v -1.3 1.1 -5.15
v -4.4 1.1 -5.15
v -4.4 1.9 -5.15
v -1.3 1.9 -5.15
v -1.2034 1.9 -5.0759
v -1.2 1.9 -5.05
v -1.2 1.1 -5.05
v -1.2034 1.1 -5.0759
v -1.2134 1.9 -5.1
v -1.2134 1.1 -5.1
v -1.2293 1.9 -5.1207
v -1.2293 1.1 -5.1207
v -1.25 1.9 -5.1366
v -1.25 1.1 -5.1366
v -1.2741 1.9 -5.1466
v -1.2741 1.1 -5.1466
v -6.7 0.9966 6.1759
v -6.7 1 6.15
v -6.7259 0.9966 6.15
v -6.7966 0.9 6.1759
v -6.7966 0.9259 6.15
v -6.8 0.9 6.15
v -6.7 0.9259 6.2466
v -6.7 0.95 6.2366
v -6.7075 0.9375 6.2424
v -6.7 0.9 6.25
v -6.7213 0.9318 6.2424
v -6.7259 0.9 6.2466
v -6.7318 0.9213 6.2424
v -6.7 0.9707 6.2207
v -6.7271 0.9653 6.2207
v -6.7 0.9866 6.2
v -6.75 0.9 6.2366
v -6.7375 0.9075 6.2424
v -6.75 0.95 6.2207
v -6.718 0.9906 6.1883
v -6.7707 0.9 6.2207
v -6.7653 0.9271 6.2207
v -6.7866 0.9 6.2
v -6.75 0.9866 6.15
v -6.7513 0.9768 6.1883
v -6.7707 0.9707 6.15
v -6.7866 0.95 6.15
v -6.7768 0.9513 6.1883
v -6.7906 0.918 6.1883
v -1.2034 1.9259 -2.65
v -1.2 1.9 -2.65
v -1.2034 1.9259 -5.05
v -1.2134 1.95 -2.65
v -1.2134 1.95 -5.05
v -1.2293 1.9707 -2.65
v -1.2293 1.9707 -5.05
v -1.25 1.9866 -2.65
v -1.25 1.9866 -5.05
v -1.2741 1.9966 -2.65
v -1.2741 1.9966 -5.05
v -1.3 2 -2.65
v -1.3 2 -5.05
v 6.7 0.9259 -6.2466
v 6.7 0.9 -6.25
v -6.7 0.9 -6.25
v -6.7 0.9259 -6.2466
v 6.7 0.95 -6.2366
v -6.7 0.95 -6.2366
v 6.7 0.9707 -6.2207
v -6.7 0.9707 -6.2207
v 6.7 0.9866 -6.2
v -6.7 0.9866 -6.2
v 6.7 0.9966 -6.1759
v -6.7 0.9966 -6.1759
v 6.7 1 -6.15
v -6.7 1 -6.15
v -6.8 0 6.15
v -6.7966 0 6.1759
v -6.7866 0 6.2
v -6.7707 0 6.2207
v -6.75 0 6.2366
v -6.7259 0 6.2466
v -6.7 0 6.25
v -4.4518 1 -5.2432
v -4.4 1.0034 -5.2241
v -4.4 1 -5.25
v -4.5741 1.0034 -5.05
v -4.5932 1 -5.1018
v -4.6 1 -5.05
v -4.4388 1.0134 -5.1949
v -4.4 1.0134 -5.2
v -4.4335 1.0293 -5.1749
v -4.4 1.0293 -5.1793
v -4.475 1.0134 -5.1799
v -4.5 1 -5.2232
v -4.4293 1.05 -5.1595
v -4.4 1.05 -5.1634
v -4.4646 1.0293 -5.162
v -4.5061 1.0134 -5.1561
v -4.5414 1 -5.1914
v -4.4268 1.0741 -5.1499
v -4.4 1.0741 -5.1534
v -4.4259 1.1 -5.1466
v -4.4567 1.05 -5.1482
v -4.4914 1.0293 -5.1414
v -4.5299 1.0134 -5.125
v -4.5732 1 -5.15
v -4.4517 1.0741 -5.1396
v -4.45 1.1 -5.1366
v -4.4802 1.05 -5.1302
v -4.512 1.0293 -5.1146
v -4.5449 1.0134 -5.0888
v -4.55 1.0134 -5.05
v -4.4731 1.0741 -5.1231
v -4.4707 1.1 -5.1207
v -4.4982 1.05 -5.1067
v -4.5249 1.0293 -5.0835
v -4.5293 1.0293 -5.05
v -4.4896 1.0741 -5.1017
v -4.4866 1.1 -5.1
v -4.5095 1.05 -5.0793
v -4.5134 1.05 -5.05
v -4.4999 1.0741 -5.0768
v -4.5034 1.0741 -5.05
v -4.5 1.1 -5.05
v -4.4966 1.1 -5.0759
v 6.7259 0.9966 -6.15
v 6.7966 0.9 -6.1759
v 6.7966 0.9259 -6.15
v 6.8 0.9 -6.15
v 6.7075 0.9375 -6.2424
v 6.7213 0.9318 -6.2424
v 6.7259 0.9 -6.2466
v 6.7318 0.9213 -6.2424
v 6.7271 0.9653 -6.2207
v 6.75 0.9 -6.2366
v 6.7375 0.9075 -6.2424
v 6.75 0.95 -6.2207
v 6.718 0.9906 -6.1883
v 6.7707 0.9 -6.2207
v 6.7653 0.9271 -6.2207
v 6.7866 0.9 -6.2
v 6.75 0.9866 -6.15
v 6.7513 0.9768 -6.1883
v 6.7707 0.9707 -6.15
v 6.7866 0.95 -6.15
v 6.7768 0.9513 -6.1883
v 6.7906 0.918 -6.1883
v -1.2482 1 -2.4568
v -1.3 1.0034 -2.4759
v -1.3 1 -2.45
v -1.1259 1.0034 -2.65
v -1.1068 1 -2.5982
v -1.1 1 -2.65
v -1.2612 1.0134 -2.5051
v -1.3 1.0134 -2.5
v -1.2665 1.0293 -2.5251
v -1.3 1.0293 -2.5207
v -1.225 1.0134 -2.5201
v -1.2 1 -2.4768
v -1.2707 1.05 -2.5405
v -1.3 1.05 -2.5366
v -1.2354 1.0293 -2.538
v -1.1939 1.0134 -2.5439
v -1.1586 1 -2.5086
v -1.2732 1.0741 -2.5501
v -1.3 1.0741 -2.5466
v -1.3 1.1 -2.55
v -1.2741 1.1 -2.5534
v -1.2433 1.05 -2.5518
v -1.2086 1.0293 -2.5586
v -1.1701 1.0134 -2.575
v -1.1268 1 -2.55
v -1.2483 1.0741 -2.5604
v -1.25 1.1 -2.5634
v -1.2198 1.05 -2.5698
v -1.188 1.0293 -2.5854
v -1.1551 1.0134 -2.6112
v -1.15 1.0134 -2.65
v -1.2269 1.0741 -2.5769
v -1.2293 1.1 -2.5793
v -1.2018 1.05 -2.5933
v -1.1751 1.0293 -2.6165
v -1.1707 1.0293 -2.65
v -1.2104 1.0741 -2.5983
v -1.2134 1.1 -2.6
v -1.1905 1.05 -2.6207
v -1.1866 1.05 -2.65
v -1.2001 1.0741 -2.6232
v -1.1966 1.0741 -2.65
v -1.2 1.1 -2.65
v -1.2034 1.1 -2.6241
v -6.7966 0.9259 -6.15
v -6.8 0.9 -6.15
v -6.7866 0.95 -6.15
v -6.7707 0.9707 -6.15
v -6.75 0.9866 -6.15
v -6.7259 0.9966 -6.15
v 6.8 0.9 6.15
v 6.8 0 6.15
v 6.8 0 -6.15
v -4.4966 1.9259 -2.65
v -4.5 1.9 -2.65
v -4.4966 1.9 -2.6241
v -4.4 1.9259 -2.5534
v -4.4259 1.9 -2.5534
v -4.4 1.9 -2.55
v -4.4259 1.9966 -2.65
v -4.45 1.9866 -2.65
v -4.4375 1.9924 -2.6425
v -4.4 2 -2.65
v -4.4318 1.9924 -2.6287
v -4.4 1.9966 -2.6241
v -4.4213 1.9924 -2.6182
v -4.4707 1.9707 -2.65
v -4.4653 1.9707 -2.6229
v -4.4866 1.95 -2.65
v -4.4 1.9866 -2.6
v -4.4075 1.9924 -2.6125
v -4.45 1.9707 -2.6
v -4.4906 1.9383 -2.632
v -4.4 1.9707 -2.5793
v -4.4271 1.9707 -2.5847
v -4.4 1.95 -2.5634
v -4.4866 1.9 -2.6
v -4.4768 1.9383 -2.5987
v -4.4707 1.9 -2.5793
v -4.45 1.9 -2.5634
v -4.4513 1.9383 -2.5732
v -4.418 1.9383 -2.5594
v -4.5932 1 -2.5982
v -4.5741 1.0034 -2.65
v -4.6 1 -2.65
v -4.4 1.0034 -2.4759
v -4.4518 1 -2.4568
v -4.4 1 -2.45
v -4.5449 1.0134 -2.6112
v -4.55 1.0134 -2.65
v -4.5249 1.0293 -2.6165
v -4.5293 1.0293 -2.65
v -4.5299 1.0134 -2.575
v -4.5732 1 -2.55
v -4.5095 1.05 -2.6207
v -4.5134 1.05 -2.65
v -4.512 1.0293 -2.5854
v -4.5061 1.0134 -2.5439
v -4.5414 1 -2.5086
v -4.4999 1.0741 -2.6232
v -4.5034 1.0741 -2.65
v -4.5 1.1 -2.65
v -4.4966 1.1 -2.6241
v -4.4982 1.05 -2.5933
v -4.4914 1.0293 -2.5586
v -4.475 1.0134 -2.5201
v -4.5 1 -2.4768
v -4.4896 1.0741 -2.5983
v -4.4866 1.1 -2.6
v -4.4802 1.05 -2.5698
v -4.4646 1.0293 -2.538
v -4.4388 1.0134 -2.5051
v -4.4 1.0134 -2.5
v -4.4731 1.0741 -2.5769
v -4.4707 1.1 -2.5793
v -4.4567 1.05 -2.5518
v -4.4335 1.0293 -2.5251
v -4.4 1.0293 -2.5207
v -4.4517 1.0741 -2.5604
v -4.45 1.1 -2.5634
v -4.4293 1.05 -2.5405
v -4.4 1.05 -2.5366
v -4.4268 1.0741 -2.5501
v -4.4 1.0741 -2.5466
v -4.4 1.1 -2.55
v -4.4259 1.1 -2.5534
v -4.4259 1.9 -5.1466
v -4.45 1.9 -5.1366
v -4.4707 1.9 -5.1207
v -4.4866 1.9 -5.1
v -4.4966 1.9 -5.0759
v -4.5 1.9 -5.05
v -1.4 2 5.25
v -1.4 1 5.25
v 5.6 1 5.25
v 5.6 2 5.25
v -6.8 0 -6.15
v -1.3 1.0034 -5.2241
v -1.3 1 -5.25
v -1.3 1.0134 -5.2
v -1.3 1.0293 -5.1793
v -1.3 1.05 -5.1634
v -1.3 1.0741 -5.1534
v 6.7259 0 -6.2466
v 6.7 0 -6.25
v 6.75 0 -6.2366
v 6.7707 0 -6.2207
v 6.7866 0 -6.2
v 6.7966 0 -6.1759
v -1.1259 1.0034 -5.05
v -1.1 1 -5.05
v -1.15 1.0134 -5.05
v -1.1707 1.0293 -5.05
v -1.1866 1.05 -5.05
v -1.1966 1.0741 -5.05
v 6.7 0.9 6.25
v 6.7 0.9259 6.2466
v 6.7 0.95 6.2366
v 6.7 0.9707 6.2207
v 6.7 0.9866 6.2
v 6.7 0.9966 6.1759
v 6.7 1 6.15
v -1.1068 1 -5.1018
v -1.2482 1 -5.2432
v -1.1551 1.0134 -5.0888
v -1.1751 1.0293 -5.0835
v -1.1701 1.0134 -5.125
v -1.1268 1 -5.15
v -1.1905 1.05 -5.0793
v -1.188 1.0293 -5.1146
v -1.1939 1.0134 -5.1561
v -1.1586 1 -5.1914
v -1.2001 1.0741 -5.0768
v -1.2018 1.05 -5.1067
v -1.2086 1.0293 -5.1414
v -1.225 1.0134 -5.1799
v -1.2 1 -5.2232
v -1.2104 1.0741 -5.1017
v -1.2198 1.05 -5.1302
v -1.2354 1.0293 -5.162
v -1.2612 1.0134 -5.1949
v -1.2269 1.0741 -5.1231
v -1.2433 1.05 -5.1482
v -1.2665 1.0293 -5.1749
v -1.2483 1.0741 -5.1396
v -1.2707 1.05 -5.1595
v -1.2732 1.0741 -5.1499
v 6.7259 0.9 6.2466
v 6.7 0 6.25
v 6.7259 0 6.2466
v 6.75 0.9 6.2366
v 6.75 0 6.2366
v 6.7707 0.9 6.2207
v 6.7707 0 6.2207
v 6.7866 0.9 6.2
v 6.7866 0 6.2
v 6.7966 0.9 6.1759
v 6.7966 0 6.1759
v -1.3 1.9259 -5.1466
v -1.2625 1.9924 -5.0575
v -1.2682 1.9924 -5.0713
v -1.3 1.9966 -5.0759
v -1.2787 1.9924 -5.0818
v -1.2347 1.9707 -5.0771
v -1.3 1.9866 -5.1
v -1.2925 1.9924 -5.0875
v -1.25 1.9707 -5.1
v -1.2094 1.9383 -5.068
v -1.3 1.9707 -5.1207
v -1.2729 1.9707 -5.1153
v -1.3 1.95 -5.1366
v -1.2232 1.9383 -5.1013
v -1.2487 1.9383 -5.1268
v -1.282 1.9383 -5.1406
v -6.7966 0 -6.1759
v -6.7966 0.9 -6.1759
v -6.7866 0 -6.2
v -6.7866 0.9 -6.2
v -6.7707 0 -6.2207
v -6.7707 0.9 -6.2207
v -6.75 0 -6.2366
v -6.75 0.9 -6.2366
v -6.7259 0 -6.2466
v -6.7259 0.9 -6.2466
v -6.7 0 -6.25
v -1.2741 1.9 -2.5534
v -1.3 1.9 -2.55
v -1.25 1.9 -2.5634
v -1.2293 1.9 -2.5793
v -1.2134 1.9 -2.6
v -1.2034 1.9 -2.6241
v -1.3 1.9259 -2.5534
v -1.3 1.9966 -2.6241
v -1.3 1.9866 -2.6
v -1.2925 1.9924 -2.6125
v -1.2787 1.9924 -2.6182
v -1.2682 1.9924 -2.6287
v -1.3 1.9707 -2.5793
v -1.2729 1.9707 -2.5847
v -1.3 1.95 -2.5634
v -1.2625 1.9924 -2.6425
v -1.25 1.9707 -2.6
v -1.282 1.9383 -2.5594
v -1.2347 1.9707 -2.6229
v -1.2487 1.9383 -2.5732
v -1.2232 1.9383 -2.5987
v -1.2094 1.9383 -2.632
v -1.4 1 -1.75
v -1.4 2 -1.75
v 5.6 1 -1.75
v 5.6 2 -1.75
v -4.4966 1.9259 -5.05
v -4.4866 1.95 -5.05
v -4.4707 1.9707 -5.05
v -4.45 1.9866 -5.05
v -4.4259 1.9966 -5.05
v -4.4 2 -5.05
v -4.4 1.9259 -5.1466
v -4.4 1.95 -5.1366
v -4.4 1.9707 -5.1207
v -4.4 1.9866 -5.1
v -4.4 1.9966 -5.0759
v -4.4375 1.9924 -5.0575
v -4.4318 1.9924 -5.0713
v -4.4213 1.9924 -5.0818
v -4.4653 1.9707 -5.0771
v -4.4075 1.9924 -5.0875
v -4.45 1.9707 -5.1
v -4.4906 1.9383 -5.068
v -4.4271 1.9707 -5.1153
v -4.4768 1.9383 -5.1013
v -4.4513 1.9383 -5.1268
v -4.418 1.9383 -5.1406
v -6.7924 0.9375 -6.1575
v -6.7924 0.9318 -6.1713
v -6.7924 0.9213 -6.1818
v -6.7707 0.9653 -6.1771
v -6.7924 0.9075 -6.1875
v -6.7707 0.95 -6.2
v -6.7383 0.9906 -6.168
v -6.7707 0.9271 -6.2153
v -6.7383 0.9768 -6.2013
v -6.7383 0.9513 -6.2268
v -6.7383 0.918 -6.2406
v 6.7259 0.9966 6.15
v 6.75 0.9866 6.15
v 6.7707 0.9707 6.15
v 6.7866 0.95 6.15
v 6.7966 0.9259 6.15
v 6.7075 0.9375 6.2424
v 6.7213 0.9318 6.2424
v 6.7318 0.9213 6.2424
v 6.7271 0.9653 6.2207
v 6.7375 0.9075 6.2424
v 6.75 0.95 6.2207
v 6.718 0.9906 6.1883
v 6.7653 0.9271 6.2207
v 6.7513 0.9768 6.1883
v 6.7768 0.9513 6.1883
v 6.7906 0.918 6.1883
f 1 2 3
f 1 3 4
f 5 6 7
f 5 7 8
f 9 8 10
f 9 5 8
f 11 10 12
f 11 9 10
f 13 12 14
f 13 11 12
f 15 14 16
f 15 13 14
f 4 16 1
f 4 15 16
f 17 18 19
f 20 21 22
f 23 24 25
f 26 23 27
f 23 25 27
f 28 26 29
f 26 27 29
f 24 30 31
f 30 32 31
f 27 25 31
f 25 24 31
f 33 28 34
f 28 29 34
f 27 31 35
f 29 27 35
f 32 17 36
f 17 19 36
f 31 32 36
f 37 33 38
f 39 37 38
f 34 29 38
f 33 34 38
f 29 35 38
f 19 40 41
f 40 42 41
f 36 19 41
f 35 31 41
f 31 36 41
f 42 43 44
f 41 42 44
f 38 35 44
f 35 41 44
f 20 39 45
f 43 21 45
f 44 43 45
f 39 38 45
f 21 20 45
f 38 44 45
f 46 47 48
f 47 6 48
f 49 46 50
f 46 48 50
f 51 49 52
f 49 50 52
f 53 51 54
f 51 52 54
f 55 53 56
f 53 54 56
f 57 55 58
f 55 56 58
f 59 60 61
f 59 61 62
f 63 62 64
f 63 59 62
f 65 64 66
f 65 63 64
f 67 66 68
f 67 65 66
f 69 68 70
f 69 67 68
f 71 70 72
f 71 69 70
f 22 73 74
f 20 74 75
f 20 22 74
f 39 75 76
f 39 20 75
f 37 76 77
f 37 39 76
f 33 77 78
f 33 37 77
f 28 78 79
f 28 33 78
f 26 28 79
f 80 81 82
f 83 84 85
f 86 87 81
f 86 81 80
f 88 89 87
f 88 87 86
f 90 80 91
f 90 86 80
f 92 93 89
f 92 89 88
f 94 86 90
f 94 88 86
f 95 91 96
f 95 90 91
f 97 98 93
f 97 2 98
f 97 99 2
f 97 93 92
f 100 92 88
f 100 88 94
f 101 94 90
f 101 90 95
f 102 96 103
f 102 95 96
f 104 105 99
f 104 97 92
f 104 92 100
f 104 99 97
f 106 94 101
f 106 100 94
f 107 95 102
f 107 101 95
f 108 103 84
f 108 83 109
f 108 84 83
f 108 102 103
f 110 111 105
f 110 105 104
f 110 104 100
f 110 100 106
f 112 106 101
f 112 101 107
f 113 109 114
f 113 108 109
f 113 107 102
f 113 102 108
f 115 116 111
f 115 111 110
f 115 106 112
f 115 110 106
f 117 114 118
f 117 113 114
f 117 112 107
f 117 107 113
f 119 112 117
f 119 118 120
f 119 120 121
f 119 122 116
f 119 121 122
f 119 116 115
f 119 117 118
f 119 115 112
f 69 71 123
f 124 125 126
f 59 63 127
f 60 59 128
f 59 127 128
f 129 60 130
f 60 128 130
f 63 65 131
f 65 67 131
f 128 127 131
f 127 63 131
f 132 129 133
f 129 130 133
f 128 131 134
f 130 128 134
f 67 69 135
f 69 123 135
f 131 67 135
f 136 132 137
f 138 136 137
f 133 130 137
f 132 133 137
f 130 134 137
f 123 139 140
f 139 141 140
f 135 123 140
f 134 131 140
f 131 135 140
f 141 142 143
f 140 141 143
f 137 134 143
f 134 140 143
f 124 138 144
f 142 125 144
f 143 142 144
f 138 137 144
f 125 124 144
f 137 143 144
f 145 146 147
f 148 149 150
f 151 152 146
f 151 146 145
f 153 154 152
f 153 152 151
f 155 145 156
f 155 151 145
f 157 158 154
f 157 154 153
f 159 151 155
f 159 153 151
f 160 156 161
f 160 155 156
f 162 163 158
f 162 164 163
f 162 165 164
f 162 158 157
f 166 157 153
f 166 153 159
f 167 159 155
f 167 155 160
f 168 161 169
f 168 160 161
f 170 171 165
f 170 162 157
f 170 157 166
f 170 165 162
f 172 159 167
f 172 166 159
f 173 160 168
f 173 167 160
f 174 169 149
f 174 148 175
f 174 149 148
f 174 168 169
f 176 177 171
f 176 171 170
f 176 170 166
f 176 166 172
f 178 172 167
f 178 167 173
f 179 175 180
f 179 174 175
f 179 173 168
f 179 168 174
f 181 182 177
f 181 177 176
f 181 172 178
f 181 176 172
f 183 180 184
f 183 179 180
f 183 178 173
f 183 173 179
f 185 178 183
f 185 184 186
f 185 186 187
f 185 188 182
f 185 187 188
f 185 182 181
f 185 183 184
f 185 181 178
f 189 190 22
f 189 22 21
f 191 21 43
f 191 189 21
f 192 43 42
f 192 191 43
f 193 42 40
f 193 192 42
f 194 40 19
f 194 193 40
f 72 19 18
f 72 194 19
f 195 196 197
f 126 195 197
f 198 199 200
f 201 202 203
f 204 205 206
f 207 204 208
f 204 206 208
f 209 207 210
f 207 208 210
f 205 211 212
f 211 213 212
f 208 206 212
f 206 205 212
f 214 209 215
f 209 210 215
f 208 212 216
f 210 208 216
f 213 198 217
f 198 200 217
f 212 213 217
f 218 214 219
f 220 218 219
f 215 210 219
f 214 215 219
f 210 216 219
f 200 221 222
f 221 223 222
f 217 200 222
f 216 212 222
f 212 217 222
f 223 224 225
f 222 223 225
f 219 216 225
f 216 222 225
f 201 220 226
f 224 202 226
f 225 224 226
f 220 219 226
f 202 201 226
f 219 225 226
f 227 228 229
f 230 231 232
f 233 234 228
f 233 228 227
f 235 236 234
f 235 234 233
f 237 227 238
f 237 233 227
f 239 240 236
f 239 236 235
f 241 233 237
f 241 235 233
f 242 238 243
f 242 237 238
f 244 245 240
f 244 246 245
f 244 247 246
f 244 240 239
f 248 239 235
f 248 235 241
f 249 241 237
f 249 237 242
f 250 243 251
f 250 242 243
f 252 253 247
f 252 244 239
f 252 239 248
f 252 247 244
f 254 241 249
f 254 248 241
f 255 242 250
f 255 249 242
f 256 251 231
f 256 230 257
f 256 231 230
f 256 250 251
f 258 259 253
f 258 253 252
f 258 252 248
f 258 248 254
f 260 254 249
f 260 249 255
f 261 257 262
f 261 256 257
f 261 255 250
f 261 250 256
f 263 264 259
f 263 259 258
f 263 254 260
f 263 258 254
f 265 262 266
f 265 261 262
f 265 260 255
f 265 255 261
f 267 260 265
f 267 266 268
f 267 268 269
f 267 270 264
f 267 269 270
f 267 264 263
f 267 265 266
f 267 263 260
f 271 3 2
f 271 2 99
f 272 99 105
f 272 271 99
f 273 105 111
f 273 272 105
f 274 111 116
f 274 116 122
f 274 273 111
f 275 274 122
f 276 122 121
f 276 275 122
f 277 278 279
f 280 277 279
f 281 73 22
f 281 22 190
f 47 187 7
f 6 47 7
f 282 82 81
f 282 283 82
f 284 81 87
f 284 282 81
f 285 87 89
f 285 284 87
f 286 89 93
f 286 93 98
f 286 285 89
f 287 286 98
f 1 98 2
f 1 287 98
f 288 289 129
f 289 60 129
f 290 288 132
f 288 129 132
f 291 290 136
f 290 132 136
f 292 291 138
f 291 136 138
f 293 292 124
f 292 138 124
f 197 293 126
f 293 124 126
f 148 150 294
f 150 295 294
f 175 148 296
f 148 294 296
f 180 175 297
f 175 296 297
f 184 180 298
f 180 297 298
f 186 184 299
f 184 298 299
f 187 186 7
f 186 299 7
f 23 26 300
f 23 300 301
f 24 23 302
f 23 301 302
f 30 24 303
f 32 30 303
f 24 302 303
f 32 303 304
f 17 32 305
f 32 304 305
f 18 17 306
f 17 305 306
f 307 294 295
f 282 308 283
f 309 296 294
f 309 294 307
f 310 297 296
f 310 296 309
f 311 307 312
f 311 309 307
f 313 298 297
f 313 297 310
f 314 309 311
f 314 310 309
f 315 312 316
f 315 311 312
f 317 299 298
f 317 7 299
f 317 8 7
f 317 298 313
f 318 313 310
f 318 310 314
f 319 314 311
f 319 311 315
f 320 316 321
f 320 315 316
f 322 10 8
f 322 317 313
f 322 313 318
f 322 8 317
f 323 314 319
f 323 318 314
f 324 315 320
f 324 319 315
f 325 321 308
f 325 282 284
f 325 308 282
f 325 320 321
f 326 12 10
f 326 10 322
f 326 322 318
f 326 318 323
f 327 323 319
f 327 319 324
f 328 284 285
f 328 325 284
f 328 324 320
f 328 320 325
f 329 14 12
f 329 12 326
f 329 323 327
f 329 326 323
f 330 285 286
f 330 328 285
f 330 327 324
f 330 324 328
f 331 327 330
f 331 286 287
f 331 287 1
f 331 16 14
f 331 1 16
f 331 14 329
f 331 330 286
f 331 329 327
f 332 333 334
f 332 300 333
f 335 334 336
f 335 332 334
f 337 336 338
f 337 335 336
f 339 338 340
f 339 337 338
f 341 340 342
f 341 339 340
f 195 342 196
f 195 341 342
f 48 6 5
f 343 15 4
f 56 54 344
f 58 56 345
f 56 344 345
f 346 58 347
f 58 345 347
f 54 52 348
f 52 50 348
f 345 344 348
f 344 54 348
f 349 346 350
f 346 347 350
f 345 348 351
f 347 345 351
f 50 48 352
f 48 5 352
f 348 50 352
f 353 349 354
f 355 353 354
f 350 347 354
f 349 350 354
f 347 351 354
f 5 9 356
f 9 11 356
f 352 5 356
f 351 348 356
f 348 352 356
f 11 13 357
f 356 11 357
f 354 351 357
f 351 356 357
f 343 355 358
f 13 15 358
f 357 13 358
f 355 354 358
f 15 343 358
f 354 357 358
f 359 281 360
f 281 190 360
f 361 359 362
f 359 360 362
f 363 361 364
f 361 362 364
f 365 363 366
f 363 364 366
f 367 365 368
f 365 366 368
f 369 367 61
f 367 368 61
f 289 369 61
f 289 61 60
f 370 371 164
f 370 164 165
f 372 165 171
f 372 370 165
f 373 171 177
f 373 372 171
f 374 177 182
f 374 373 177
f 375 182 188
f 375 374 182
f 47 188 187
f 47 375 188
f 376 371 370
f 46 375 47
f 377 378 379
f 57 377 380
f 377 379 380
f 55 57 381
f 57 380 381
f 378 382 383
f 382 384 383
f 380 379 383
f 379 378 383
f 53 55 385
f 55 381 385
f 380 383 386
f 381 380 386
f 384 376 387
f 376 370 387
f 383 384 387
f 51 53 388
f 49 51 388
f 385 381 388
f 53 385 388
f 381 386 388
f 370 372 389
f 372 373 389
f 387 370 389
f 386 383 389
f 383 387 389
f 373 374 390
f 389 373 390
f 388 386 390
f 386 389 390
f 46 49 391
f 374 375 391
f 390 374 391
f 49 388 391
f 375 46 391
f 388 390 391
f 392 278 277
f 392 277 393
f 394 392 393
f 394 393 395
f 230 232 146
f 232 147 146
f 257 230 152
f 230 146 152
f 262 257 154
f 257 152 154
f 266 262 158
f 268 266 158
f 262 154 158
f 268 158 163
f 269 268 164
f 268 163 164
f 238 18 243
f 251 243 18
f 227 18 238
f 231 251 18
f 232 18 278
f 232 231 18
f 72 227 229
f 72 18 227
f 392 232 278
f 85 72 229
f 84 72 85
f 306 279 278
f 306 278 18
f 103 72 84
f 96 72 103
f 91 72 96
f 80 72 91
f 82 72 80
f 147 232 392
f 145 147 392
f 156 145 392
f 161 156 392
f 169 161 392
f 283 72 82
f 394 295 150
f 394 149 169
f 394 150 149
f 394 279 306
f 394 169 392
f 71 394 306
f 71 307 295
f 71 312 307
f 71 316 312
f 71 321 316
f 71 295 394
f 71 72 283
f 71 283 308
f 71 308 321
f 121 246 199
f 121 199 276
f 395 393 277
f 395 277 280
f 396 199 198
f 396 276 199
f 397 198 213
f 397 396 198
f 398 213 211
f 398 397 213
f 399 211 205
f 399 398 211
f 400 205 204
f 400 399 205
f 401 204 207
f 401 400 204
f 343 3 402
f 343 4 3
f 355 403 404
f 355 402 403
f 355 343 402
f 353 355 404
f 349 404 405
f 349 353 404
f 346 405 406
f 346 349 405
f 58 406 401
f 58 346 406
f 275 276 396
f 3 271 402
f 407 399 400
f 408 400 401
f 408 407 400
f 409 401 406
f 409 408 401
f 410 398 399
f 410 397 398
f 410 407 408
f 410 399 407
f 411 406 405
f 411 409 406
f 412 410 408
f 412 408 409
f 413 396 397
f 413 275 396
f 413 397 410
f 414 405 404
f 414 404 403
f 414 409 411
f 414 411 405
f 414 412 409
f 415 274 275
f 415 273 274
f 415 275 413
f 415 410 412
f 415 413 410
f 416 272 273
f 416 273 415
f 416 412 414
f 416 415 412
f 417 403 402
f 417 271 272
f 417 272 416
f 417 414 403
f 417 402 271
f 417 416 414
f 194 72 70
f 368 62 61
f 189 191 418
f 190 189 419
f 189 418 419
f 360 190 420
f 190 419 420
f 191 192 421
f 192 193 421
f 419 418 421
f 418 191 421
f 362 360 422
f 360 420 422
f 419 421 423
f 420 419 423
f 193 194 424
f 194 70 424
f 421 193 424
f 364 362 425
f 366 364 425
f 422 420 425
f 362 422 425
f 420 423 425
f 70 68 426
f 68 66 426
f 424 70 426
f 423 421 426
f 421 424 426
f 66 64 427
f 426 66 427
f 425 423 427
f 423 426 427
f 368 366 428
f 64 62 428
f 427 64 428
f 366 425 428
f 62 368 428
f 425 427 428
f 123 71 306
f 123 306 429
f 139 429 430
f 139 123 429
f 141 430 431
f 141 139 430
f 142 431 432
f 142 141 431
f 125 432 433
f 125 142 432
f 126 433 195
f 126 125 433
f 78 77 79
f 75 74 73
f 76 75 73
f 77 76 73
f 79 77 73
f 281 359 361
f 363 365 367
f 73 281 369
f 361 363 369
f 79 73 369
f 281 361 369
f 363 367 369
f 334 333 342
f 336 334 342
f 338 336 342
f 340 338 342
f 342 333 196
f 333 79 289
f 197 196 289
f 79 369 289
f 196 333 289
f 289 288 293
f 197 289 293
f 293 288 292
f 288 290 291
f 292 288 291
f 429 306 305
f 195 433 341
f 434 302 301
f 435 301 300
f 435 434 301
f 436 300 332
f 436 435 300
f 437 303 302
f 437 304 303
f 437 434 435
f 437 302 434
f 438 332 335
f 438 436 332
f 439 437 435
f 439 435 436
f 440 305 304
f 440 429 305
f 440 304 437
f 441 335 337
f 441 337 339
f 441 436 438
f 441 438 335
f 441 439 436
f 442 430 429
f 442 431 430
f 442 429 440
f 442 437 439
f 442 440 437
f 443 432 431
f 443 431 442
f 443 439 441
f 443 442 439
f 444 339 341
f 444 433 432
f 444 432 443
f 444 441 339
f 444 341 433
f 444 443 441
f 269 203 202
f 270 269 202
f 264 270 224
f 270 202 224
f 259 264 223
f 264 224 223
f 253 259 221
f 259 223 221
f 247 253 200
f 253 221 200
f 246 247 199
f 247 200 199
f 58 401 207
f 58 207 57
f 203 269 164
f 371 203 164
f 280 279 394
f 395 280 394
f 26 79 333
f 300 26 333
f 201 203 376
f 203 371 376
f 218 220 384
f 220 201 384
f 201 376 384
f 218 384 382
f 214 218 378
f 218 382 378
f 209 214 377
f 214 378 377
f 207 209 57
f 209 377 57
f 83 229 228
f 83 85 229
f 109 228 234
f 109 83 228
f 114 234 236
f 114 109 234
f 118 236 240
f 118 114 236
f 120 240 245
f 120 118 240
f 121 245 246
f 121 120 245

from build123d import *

# Parameters (mm, degrees)
SKETCH1_W           = 13.6
SKETCH1_H           = 12.5
BOSS_EXTRUDE1_DEPTH = 1
SKETCH2_W           = 7
SKETCH2_H           = 7
BOSS_EXTRUDE2_DEPTH = 1
SKETCH3_W           = 3.3
SKETCH3_H           = 2.6
BOSS_EXTRUDE3_DEPTH = 1
FILLET1_R           = 0.1


with BuildPart() as part:
    # Sketch1 → Boss-Extrude1 (new body)
    with BuildSketch(Plane(origin=(0, 0, 0), x_dir=(1, 0, 0), z_dir=(0, 1, 0))):
        Rectangle(SKETCH1_W, SKETCH1_H)
    extrude(amount=BOSS_EXTRUDE1_DEPTH)

    # Sketch2 → Boss-Extrude2 (add)
    with BuildSketch(Plane(origin=(0, 1, 0), x_dir=(1, 0, 0), z_dir=(0, 1, 0))):
        with Locations((2.1, -1.75)):
            Rectangle(SKETCH2_W, SKETCH2_H)
    extrude(amount=BOSS_EXTRUDE2_DEPTH)

    # Sketch3 → Boss-Extrude3 (add)
    with BuildSketch(Plane(origin=(0, 1, 0), x_dir=(1, 0, 0), z_dir=(0, 1, 0))):
        with Locations((-2.85, 3.85)):
            Rectangle(SKETCH3_W, SKETCH3_H)
    extrude(amount=BOSS_EXTRUDE3_DEPTH)

    # Fillet1
    fillet1_edges = [part.edges().sort_by_distance(p)[0] for p in [
        (6.8, 1, 0),
        (0, 1, -6.25),
        (-4.5, 1, -3.85),
        (-4.5, 1.5, -5.15),
        (-2.85, 1, -2.55),
        (-4.5, 1.5, -2.55),
        (-1.2, 1, -3.85),
        (-1.2, 1.5, -2.55),
        (-2.85, 1, -5.15),
        (-1.2, 1.5, -5.15),
        (-4.5, 2, -3.85),
        (-2.85, 2, -2.55),
        (-1.2, 2, -3.85),
        (-2.85, 2, -5.15),
        (-6.8, 1, 0),
        (0, 1, 6.25),
        (-6.8, 0.5, -6.25),
        (6.8, 0.5, -6.25),
        (6.8, 0.5, 6.25),
        (-6.8, 0.5, 6.25),
    ]]
    fillet(fillet1_edges, radius=FILLET1_R)


solid = part.part
